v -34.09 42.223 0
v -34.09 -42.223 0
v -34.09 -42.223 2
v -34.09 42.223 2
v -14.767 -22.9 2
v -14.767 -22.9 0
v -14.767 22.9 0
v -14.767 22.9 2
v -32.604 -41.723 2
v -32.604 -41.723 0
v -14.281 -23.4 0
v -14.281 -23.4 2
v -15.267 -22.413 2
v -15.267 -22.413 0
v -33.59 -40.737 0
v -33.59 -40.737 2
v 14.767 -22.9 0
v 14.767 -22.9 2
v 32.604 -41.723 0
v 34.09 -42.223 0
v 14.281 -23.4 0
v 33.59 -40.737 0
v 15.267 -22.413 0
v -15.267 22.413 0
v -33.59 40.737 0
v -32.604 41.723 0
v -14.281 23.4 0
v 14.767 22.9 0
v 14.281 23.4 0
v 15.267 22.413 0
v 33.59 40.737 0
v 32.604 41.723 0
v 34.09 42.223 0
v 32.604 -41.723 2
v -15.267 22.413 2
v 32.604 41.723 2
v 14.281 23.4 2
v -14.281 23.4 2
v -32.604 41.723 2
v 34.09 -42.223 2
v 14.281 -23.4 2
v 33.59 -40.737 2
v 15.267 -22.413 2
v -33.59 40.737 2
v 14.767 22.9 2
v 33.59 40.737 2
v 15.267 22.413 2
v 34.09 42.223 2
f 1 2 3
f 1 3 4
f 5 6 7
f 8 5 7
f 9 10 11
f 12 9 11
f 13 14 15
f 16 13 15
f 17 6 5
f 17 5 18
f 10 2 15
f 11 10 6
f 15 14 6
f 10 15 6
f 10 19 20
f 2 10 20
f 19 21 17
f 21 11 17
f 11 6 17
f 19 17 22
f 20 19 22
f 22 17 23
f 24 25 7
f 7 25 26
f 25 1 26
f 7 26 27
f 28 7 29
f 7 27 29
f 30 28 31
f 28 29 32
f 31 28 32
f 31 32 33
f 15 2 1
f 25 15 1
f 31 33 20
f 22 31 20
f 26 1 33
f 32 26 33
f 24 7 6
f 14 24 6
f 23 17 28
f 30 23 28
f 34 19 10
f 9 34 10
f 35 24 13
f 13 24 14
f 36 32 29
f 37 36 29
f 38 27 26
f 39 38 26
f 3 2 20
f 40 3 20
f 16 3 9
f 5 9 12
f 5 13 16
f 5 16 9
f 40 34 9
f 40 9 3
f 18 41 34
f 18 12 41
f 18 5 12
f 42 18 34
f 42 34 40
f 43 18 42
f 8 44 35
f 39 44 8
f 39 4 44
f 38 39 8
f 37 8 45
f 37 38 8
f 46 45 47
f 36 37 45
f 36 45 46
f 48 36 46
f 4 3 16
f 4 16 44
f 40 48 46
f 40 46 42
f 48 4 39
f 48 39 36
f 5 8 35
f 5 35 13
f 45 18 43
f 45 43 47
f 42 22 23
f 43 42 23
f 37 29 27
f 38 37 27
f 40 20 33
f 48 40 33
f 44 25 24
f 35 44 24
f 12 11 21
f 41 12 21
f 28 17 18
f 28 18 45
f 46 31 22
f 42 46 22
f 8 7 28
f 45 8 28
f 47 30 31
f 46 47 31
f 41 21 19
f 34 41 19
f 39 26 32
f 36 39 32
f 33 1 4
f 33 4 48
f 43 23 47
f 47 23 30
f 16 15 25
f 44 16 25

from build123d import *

# Parameters (mm, degrees)
F0_W     = 68.180988
F0_H     = 84.445938
F0_W_2   = 29.534492
F0_H_2   = 45.799442
F1_DEPTH = 2


with BuildPart() as f1:
    # F0 (on Top) → F1 (new body)
    with BuildSketch(Plane.XY):
        Rectangle(F0_W, F0_H)
        Polygon((-33.590494, 40.736501), (-33.590494, 41.722969), (-32.604026, 41.722969), (32.604026, 41.722969), (33.590494, 41.722969), (33.590494, 40.736501), (33.590494, -40.736501), (33.590494, -41.722969), (32.604026, -41.722969), (-32.604026, -41.722969), (-33.590494, -41.722969), (-33.590494, -40.736501), align=None, mode=Mode.SUBTRACT)
        Polygon((-15.267246, -22.413252), (-33.590494, -40.736501), (-33.590494, -41.722969), (-32.604026, -41.722969), (-14.280777, -23.399721), (-15.267246, -23.399721), align=None)
        Polygon((-32.604026, 41.722969), (-33.590494, 41.722969), (-33.590494, 40.736501), (-15.267246, 22.413252), (-15.267246, 23.399721), (-14.280777, 23.399721), align=None)
        Polygon((33.590494, 41.722969), (32.604026, 41.722969), (14.280777, 23.399721), (15.267246, 23.399721), (15.267246, 22.413252), (33.590494, 40.736501), align=None)
        Polygon((14.280777, -23.399721), (32.604026, -41.722969), (33.590494, -41.722969), (33.590494, -40.736501), (15.267246, -22.413252), (15.267246, -23.399721), align=None)
        Polygon((-15.267246, 23.399721), (-15.267246, 22.413252), (-15.267246, -22.413252), (-15.267246, -23.399721), (-14.280777, -23.399721), (14.280777, -23.399721), (15.267246, -23.399721), (15.267246, -22.413252), (15.267246, 22.413252), (15.267246, 23.399721), (14.280777, 23.399721), (-14.280777, 23.399721), align=None)
        Rectangle(F0_W_2, F0_H_2, mode=Mode.SUBTRACT)
    extrude(amount=F1_DEPTH)


solid = f1.part
